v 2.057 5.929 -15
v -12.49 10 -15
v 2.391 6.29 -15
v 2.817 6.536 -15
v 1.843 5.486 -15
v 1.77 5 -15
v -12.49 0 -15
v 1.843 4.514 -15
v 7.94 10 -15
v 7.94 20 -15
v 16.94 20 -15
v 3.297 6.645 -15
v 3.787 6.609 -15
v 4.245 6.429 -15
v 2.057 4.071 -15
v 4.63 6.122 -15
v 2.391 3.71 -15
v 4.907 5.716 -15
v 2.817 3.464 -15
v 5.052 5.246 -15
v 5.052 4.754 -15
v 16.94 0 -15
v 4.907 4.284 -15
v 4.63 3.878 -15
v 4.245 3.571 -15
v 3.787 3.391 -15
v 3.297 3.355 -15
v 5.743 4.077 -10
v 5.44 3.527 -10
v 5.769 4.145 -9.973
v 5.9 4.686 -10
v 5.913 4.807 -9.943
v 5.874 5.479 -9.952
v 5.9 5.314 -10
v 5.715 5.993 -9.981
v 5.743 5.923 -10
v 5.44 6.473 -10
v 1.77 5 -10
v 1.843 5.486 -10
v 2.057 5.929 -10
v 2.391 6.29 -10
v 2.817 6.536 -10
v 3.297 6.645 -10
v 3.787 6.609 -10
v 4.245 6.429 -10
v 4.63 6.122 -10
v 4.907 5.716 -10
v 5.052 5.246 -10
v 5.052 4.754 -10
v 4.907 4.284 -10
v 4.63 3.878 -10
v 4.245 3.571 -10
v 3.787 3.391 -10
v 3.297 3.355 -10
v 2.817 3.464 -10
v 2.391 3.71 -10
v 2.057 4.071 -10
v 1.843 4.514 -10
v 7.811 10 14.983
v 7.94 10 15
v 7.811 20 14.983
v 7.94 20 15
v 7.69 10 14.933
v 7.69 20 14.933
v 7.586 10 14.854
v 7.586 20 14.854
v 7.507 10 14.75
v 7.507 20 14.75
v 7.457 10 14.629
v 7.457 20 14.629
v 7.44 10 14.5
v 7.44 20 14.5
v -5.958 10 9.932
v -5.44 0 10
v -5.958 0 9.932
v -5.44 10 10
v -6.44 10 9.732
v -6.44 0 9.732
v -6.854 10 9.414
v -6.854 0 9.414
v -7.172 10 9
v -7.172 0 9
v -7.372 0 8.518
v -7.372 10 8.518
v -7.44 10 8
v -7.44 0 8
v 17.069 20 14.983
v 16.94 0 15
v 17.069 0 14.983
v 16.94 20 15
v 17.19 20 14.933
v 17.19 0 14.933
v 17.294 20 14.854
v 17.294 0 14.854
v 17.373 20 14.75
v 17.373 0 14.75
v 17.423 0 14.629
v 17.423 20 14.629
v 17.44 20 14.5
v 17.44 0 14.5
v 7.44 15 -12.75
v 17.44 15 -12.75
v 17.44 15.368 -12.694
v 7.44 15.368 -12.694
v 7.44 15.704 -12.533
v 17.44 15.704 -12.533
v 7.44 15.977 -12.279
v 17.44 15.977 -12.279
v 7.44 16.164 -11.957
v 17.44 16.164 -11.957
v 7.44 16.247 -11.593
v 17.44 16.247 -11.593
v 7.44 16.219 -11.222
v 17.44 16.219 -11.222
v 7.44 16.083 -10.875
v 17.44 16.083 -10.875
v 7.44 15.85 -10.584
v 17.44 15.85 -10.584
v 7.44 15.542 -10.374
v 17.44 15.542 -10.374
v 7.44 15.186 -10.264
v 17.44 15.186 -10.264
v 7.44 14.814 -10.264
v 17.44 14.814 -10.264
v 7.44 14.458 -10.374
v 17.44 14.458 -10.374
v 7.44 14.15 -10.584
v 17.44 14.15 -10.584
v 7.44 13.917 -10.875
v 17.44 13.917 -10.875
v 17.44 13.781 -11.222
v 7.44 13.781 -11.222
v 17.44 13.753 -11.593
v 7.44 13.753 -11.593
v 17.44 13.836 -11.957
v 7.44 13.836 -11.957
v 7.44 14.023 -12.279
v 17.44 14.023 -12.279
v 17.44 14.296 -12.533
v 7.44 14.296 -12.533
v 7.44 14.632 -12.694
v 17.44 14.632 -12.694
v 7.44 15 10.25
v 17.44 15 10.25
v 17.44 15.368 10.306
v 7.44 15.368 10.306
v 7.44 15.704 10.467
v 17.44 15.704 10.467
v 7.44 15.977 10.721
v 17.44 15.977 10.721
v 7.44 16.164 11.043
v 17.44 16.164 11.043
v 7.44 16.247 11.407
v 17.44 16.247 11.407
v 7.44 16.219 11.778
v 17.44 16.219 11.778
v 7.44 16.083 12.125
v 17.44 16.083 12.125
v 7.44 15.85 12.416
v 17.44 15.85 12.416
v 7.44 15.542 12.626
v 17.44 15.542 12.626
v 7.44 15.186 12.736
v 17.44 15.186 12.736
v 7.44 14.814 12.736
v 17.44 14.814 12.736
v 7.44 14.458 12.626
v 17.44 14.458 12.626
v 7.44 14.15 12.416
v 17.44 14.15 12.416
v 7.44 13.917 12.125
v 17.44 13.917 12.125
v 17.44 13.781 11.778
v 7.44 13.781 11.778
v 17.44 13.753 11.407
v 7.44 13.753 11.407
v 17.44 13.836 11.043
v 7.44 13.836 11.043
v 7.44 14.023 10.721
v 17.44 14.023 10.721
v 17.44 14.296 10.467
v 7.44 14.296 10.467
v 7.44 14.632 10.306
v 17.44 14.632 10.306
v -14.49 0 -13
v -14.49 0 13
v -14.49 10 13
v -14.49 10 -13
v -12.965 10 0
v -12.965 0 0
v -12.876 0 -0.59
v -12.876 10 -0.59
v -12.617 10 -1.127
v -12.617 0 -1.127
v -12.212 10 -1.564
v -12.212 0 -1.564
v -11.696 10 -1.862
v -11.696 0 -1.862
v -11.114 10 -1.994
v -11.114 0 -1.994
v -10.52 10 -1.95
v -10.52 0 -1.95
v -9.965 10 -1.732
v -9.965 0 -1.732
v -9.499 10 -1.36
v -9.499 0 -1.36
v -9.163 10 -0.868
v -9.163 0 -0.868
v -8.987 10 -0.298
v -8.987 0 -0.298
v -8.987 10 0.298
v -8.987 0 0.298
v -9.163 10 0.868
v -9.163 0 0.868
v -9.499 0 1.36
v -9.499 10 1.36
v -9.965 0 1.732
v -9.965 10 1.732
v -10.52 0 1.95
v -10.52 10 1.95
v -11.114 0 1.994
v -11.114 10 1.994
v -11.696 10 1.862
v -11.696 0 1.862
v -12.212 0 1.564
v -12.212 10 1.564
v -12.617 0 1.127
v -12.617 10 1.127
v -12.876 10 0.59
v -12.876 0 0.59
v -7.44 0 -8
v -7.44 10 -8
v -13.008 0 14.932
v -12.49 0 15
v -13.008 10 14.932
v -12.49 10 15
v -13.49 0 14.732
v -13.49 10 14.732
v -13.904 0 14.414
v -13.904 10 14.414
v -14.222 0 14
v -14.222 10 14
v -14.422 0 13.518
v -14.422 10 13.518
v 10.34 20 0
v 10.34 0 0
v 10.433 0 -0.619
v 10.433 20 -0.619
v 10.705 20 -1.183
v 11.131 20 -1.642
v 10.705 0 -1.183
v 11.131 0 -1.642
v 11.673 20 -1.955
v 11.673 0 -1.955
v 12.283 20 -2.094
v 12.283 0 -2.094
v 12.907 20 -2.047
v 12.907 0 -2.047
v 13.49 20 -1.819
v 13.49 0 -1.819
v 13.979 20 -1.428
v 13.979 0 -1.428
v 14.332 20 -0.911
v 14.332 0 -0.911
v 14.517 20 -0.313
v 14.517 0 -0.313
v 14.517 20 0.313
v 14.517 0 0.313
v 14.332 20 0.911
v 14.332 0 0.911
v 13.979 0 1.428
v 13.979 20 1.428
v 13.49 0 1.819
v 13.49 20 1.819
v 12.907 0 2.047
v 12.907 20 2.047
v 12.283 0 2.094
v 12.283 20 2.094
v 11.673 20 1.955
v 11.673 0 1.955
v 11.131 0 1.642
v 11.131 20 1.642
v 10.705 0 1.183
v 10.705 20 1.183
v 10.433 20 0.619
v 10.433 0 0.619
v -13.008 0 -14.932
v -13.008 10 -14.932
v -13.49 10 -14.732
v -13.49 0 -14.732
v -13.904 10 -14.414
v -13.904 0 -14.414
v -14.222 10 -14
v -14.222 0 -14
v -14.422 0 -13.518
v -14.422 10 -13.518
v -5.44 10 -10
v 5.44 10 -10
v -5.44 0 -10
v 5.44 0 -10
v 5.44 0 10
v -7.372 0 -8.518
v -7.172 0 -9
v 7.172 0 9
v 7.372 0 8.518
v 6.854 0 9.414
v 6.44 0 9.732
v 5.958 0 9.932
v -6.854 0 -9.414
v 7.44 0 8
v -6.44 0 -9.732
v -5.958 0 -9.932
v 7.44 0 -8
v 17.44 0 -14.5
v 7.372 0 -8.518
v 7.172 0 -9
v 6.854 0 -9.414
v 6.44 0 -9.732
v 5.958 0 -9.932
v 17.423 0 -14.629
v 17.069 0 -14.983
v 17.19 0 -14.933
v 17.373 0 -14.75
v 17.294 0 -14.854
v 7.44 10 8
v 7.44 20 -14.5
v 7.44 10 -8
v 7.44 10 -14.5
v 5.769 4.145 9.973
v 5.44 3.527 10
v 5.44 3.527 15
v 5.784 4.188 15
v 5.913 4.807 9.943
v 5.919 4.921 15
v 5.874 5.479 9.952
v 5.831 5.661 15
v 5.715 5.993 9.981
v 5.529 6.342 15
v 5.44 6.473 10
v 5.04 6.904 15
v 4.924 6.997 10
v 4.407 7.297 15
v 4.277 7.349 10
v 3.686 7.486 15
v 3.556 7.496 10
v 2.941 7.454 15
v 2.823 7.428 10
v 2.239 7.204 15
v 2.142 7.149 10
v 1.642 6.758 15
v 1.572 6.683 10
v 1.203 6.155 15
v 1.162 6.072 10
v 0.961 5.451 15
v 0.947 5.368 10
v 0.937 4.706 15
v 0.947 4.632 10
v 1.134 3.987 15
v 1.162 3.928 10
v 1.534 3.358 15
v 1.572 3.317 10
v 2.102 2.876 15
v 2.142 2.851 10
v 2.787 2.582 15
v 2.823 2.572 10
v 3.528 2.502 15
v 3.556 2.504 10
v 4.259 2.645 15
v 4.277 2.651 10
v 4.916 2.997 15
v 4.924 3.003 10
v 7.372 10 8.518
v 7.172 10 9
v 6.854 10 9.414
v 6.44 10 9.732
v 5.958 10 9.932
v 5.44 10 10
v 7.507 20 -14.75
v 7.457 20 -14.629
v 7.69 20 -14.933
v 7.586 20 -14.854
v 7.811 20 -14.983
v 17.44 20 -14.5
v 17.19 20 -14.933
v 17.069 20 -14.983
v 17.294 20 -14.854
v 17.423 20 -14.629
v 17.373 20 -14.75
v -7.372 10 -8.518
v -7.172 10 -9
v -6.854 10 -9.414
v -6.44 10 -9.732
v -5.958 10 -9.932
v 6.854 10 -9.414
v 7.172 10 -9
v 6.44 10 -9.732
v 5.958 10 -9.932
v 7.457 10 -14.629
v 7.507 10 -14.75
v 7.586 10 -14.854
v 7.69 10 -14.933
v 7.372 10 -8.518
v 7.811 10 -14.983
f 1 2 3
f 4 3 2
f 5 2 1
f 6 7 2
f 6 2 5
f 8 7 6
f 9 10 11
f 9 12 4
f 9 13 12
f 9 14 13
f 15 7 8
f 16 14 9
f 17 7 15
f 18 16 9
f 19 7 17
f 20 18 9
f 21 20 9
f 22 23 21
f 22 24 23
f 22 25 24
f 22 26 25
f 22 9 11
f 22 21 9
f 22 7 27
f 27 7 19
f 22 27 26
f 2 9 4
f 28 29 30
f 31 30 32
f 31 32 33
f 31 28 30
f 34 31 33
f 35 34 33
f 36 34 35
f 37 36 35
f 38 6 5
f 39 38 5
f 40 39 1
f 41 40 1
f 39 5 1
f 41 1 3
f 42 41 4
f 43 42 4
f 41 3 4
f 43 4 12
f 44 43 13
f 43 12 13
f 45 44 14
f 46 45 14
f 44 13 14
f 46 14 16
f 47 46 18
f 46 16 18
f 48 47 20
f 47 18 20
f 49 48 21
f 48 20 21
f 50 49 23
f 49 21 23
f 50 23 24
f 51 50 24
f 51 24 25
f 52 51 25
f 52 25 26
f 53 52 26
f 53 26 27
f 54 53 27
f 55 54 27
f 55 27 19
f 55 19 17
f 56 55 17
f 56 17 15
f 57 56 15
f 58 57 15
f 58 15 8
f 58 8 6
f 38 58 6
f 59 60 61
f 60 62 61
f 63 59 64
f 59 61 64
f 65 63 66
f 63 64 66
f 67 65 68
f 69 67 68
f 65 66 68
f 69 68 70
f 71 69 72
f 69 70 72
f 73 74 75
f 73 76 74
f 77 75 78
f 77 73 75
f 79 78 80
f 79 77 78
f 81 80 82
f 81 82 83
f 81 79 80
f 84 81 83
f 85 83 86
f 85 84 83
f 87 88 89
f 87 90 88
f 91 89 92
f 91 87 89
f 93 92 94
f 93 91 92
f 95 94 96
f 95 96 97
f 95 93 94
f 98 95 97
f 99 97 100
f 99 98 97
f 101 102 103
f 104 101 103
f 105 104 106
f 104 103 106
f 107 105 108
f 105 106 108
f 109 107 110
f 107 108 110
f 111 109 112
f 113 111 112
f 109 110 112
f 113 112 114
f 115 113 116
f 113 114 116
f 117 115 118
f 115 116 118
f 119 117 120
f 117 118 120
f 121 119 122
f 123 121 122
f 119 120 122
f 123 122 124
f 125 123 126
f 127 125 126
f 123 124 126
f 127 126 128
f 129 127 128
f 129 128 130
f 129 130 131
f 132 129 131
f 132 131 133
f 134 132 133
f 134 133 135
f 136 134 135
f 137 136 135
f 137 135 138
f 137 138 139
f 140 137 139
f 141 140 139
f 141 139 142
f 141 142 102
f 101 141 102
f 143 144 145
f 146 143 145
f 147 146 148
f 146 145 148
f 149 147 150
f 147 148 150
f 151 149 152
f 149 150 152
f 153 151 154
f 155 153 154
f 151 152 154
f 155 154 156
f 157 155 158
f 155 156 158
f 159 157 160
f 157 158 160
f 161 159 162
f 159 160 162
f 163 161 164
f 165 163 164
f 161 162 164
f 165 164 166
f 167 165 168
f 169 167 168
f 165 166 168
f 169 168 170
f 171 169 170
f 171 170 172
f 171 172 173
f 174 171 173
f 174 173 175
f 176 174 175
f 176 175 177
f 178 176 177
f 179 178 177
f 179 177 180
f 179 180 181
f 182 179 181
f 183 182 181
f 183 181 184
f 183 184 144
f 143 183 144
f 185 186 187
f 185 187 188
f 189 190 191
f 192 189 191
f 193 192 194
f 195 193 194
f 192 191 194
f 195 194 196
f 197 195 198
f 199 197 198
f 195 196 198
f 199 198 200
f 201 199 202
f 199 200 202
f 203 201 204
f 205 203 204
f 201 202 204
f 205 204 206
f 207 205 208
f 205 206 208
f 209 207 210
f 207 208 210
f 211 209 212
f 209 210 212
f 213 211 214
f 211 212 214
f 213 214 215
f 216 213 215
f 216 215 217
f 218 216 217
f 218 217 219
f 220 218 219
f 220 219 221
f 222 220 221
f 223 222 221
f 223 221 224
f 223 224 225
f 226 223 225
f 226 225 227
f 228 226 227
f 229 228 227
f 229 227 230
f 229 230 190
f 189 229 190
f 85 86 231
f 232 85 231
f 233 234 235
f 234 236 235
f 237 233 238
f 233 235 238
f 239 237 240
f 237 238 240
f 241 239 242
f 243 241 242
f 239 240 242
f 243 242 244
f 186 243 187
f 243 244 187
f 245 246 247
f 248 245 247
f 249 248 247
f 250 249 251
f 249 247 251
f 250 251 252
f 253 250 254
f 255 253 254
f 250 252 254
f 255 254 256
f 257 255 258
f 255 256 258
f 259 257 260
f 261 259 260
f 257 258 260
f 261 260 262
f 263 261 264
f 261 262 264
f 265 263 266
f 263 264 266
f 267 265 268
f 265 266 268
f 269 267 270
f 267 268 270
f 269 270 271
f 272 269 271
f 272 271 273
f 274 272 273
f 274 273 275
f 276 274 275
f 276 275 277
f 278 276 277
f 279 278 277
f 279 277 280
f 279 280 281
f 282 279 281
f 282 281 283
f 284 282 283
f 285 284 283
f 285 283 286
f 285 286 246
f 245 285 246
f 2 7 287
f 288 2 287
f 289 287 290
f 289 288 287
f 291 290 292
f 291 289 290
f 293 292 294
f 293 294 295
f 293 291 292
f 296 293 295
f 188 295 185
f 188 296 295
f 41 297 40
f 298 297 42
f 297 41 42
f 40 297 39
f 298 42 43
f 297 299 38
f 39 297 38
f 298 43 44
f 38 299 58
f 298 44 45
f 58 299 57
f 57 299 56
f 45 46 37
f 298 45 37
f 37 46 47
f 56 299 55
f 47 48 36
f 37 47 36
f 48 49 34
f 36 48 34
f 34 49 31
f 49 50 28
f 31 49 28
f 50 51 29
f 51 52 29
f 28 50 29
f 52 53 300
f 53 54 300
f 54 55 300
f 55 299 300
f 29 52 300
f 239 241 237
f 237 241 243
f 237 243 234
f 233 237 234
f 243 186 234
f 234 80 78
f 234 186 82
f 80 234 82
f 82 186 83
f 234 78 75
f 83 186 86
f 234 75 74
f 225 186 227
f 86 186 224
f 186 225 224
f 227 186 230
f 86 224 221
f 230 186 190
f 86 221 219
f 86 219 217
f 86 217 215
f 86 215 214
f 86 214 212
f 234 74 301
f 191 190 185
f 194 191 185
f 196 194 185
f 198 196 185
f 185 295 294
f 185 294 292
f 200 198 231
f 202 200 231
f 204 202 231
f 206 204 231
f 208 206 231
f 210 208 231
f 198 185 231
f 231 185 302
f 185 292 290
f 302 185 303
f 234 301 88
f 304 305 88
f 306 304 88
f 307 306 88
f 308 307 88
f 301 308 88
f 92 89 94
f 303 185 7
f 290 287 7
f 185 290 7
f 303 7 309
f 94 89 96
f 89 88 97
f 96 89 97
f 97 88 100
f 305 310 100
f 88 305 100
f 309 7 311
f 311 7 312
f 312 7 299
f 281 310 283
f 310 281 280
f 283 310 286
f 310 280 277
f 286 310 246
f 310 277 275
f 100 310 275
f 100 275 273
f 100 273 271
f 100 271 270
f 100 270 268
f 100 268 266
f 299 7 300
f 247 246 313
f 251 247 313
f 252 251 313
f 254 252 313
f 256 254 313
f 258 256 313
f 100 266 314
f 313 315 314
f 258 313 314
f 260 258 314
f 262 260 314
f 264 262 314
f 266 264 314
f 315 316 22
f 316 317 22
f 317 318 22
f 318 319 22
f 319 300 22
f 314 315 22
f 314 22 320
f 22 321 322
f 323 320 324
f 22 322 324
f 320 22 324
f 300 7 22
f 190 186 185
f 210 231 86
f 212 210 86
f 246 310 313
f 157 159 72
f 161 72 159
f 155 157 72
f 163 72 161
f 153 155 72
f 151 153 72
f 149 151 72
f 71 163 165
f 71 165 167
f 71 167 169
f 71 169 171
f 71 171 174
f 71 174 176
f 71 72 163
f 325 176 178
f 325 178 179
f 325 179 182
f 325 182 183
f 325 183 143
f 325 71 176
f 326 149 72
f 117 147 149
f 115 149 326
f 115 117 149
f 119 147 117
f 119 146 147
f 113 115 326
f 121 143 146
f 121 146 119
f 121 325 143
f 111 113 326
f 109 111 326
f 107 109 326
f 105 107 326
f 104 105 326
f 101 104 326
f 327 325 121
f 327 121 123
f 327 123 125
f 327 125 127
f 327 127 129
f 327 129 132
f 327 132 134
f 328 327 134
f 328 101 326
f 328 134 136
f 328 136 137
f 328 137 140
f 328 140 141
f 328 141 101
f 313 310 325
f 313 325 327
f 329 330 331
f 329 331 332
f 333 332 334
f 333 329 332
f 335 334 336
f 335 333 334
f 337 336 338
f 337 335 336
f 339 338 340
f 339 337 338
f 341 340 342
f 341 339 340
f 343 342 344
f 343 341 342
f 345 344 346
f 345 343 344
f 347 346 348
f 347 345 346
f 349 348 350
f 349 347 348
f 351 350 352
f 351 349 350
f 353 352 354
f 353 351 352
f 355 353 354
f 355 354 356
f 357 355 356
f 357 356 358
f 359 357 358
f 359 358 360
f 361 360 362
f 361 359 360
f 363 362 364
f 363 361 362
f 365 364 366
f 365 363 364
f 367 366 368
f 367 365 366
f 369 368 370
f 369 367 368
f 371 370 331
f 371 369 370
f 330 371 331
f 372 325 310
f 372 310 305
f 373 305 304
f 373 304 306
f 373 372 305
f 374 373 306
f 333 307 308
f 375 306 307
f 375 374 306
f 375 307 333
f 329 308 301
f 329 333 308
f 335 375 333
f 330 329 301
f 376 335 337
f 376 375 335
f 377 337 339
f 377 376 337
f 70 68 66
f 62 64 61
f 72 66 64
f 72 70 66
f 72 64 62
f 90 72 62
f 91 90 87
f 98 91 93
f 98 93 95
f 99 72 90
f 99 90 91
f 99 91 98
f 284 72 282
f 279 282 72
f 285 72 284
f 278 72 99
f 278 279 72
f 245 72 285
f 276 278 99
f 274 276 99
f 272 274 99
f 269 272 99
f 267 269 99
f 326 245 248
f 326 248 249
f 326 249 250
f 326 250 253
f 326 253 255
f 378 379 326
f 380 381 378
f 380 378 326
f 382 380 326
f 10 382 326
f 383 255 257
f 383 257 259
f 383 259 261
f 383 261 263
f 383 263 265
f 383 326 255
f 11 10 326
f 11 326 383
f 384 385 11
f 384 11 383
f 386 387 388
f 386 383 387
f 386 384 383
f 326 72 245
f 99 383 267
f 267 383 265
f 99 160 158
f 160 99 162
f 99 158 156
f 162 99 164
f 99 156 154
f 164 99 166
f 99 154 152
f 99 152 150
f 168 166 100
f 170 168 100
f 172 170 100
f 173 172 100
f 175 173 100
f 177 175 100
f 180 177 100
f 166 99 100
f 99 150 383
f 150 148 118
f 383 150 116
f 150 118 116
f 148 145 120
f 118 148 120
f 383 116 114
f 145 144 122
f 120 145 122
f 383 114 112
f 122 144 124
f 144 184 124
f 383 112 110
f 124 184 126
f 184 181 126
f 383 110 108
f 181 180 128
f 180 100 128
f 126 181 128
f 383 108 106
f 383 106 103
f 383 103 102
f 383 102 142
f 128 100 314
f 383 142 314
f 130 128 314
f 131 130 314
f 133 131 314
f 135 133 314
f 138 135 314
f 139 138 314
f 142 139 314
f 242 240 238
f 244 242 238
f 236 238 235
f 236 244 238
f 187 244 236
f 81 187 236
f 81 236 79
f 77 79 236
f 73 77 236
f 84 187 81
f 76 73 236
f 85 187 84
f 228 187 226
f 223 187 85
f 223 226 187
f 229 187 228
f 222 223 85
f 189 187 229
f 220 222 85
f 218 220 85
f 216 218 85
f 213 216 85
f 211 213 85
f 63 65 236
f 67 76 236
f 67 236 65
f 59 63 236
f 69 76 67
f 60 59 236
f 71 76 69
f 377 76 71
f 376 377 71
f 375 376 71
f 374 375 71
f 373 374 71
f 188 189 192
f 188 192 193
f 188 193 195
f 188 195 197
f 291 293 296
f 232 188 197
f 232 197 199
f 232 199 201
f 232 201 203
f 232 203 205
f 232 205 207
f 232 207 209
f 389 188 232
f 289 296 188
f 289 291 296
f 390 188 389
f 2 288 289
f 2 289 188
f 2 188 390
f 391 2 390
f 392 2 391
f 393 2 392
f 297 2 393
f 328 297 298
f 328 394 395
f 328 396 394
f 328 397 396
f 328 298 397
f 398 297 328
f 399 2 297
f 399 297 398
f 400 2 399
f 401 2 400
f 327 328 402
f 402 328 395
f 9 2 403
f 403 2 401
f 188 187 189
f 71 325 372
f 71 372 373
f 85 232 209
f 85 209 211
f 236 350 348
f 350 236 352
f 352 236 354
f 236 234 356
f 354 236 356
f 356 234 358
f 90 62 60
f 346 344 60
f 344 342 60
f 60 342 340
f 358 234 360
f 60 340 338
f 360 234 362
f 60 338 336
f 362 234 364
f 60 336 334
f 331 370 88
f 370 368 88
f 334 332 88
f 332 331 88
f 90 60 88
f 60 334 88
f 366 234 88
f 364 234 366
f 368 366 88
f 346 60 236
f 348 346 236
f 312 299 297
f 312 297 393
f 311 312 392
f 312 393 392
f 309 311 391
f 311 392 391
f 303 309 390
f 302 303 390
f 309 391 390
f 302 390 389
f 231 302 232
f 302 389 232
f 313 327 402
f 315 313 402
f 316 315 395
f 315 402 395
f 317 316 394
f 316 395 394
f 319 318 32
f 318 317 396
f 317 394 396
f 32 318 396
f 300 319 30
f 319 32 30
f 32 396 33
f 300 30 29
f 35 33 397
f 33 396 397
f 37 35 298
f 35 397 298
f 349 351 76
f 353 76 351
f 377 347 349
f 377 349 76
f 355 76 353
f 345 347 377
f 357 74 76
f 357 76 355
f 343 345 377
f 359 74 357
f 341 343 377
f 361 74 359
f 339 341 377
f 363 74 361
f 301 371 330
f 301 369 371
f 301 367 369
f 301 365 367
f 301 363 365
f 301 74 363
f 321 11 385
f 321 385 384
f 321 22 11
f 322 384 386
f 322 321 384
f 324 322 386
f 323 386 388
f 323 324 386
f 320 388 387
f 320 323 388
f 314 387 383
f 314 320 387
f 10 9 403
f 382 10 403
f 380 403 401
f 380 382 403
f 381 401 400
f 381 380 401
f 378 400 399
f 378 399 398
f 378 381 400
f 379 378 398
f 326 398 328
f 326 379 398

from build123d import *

# Parameters (mm, degrees)
SKETCH1_W                   = 31.93
SKETCH1_H                   = 30
SKETCH1_W_2                 = 14.88
SKETCH1_H_2                 = 20
BOSS_EXTRUDE1_DEPTH         = 10
SKETCH2_W                   = 10
SKETCH2_H                   = 30
BOSS_EXTRUDE2_DEPTH         = 10
TAP_DRILL_FOR_M5X0_8_TAP1_D = 4.2
FILLET2_R                   = 2
SKETCH5_R                   = 2.5
CUT_EXTRUDE2_DEPTH          = 37.457558887
TAP_DRILL_FOR_M4X0_7_TAP1_D = 3.3
FILLET3_R                   = 2
FILLET4_R                   = 0.5
TAP_DRILL_FOR_M3X0_5_TAP1_D = 2.5
F_4_0_4_DIAMETER_HOLE1_D    = 4


with BuildPart() as part:
    # Sketch1 → Boss-Extrude1 (new body)
    with BuildSketch(Plane(origin=(0, 0, 0), x_dir=(1, 0, 0), z_dir=(0, 1, 0))):
        with Locations((1.475, 0)):
            Rectangle(SKETCH1_W, SKETCH1_H)
        Rectangle(SKETCH1_W_2, SKETCH1_H_2, mode=Mode.SUBTRACT)
    extrude(amount=BOSS_EXTRUDE1_DEPTH)

    # Sketch2 → Boss-Extrude2 (add)
    with BuildSketch(Plane(origin=(0, 10, 0), x_dir=(1, 0, 0), z_dir=(0, 1, 0))):
        with Locations((12.44, 0)):
            Rectangle(SKETCH2_W, SKETCH2_H)
    extrude(amount=BOSS_EXTRUDE2_DEPTH)

    # Tap Drill for M5x0.8 Tap1 (through all)
    with Locations(Plane(origin=(0, 20, 0), x_dir=(1, 0, 0), z_dir=(0, 1, 0))):
        with Locations((12.44, 0)):
            Hole(TAP_DRILL_FOR_M5X0_8_TAP1_D / 2)

    # Fillet2
    fillet2_edges = [part.edges().sort_by_distance(p)[0] for p in [
        (-7.44, 5, -10),
        (-7.44, 5, 10),
        (7.44, 5, 10),
        (7.44, 5, -10),
    ]]
    fillet(fillet2_edges, radius=FILLET2_R)

    # Sketch5 → Cut-Extrude2 (cut, through all)
    with BuildSketch(Plane.XY.offset(-10)):
        with Locations(Location((3.42, 5, 0), (0, 0, 323.900983741))):
            Circle(SKETCH5_R)
    extrude(amount=CUT_EXTRUDE2_DEPTH, mode=Mode.SUBTRACT)

    # Tap Drill for M4x0.7 Tap1 (through all)
    with Locations(Plane.XY.offset(-10)):
        with Locations((3.42, 5)):
            Hole(TAP_DRILL_FOR_M4X0_7_TAP1_D / 2)

    # Fillet3
    fillet3_edges = [part.edges().sort_by_distance(p)[0] for p in [
        (-14.49, 5, -15),
        (-14.49, 5, 15),
    ]]
    fillet(fillet3_edges, radius=FILLET3_R)

    # Fillet4
    fillet4_edges = [part.edges().sort_by_distance(p)[0] for p in [
        (7.44, 15, -15),
        (7.44, 15, 15),
        (17.44, 10, -15),
        (17.44, 10, 15),
    ]]
    fillet(fillet4_edges, radius=FILLET4_R)

    # Tap Drill for M3x0.5 Tap1 (through all)
    with Locations(Plane.ZY.offset(-7.44)):
        with Locations((-11.5, 15), (11.5, 15)):
            Hole(TAP_DRILL_FOR_M3X0_5_TAP1_D / 2)

    # Ø4.0 (4) Diameter Hole1 (through all)
    with Locations(Plane(origin=(0, 10, 0), x_dir=(1, 0, 0), z_dir=(0, 1, 0))):
        with Locations((-10.965, 0)):
            Hole(F_4_0_4_DIAMETER_HOLE1_D / 2)


solid = part.part
